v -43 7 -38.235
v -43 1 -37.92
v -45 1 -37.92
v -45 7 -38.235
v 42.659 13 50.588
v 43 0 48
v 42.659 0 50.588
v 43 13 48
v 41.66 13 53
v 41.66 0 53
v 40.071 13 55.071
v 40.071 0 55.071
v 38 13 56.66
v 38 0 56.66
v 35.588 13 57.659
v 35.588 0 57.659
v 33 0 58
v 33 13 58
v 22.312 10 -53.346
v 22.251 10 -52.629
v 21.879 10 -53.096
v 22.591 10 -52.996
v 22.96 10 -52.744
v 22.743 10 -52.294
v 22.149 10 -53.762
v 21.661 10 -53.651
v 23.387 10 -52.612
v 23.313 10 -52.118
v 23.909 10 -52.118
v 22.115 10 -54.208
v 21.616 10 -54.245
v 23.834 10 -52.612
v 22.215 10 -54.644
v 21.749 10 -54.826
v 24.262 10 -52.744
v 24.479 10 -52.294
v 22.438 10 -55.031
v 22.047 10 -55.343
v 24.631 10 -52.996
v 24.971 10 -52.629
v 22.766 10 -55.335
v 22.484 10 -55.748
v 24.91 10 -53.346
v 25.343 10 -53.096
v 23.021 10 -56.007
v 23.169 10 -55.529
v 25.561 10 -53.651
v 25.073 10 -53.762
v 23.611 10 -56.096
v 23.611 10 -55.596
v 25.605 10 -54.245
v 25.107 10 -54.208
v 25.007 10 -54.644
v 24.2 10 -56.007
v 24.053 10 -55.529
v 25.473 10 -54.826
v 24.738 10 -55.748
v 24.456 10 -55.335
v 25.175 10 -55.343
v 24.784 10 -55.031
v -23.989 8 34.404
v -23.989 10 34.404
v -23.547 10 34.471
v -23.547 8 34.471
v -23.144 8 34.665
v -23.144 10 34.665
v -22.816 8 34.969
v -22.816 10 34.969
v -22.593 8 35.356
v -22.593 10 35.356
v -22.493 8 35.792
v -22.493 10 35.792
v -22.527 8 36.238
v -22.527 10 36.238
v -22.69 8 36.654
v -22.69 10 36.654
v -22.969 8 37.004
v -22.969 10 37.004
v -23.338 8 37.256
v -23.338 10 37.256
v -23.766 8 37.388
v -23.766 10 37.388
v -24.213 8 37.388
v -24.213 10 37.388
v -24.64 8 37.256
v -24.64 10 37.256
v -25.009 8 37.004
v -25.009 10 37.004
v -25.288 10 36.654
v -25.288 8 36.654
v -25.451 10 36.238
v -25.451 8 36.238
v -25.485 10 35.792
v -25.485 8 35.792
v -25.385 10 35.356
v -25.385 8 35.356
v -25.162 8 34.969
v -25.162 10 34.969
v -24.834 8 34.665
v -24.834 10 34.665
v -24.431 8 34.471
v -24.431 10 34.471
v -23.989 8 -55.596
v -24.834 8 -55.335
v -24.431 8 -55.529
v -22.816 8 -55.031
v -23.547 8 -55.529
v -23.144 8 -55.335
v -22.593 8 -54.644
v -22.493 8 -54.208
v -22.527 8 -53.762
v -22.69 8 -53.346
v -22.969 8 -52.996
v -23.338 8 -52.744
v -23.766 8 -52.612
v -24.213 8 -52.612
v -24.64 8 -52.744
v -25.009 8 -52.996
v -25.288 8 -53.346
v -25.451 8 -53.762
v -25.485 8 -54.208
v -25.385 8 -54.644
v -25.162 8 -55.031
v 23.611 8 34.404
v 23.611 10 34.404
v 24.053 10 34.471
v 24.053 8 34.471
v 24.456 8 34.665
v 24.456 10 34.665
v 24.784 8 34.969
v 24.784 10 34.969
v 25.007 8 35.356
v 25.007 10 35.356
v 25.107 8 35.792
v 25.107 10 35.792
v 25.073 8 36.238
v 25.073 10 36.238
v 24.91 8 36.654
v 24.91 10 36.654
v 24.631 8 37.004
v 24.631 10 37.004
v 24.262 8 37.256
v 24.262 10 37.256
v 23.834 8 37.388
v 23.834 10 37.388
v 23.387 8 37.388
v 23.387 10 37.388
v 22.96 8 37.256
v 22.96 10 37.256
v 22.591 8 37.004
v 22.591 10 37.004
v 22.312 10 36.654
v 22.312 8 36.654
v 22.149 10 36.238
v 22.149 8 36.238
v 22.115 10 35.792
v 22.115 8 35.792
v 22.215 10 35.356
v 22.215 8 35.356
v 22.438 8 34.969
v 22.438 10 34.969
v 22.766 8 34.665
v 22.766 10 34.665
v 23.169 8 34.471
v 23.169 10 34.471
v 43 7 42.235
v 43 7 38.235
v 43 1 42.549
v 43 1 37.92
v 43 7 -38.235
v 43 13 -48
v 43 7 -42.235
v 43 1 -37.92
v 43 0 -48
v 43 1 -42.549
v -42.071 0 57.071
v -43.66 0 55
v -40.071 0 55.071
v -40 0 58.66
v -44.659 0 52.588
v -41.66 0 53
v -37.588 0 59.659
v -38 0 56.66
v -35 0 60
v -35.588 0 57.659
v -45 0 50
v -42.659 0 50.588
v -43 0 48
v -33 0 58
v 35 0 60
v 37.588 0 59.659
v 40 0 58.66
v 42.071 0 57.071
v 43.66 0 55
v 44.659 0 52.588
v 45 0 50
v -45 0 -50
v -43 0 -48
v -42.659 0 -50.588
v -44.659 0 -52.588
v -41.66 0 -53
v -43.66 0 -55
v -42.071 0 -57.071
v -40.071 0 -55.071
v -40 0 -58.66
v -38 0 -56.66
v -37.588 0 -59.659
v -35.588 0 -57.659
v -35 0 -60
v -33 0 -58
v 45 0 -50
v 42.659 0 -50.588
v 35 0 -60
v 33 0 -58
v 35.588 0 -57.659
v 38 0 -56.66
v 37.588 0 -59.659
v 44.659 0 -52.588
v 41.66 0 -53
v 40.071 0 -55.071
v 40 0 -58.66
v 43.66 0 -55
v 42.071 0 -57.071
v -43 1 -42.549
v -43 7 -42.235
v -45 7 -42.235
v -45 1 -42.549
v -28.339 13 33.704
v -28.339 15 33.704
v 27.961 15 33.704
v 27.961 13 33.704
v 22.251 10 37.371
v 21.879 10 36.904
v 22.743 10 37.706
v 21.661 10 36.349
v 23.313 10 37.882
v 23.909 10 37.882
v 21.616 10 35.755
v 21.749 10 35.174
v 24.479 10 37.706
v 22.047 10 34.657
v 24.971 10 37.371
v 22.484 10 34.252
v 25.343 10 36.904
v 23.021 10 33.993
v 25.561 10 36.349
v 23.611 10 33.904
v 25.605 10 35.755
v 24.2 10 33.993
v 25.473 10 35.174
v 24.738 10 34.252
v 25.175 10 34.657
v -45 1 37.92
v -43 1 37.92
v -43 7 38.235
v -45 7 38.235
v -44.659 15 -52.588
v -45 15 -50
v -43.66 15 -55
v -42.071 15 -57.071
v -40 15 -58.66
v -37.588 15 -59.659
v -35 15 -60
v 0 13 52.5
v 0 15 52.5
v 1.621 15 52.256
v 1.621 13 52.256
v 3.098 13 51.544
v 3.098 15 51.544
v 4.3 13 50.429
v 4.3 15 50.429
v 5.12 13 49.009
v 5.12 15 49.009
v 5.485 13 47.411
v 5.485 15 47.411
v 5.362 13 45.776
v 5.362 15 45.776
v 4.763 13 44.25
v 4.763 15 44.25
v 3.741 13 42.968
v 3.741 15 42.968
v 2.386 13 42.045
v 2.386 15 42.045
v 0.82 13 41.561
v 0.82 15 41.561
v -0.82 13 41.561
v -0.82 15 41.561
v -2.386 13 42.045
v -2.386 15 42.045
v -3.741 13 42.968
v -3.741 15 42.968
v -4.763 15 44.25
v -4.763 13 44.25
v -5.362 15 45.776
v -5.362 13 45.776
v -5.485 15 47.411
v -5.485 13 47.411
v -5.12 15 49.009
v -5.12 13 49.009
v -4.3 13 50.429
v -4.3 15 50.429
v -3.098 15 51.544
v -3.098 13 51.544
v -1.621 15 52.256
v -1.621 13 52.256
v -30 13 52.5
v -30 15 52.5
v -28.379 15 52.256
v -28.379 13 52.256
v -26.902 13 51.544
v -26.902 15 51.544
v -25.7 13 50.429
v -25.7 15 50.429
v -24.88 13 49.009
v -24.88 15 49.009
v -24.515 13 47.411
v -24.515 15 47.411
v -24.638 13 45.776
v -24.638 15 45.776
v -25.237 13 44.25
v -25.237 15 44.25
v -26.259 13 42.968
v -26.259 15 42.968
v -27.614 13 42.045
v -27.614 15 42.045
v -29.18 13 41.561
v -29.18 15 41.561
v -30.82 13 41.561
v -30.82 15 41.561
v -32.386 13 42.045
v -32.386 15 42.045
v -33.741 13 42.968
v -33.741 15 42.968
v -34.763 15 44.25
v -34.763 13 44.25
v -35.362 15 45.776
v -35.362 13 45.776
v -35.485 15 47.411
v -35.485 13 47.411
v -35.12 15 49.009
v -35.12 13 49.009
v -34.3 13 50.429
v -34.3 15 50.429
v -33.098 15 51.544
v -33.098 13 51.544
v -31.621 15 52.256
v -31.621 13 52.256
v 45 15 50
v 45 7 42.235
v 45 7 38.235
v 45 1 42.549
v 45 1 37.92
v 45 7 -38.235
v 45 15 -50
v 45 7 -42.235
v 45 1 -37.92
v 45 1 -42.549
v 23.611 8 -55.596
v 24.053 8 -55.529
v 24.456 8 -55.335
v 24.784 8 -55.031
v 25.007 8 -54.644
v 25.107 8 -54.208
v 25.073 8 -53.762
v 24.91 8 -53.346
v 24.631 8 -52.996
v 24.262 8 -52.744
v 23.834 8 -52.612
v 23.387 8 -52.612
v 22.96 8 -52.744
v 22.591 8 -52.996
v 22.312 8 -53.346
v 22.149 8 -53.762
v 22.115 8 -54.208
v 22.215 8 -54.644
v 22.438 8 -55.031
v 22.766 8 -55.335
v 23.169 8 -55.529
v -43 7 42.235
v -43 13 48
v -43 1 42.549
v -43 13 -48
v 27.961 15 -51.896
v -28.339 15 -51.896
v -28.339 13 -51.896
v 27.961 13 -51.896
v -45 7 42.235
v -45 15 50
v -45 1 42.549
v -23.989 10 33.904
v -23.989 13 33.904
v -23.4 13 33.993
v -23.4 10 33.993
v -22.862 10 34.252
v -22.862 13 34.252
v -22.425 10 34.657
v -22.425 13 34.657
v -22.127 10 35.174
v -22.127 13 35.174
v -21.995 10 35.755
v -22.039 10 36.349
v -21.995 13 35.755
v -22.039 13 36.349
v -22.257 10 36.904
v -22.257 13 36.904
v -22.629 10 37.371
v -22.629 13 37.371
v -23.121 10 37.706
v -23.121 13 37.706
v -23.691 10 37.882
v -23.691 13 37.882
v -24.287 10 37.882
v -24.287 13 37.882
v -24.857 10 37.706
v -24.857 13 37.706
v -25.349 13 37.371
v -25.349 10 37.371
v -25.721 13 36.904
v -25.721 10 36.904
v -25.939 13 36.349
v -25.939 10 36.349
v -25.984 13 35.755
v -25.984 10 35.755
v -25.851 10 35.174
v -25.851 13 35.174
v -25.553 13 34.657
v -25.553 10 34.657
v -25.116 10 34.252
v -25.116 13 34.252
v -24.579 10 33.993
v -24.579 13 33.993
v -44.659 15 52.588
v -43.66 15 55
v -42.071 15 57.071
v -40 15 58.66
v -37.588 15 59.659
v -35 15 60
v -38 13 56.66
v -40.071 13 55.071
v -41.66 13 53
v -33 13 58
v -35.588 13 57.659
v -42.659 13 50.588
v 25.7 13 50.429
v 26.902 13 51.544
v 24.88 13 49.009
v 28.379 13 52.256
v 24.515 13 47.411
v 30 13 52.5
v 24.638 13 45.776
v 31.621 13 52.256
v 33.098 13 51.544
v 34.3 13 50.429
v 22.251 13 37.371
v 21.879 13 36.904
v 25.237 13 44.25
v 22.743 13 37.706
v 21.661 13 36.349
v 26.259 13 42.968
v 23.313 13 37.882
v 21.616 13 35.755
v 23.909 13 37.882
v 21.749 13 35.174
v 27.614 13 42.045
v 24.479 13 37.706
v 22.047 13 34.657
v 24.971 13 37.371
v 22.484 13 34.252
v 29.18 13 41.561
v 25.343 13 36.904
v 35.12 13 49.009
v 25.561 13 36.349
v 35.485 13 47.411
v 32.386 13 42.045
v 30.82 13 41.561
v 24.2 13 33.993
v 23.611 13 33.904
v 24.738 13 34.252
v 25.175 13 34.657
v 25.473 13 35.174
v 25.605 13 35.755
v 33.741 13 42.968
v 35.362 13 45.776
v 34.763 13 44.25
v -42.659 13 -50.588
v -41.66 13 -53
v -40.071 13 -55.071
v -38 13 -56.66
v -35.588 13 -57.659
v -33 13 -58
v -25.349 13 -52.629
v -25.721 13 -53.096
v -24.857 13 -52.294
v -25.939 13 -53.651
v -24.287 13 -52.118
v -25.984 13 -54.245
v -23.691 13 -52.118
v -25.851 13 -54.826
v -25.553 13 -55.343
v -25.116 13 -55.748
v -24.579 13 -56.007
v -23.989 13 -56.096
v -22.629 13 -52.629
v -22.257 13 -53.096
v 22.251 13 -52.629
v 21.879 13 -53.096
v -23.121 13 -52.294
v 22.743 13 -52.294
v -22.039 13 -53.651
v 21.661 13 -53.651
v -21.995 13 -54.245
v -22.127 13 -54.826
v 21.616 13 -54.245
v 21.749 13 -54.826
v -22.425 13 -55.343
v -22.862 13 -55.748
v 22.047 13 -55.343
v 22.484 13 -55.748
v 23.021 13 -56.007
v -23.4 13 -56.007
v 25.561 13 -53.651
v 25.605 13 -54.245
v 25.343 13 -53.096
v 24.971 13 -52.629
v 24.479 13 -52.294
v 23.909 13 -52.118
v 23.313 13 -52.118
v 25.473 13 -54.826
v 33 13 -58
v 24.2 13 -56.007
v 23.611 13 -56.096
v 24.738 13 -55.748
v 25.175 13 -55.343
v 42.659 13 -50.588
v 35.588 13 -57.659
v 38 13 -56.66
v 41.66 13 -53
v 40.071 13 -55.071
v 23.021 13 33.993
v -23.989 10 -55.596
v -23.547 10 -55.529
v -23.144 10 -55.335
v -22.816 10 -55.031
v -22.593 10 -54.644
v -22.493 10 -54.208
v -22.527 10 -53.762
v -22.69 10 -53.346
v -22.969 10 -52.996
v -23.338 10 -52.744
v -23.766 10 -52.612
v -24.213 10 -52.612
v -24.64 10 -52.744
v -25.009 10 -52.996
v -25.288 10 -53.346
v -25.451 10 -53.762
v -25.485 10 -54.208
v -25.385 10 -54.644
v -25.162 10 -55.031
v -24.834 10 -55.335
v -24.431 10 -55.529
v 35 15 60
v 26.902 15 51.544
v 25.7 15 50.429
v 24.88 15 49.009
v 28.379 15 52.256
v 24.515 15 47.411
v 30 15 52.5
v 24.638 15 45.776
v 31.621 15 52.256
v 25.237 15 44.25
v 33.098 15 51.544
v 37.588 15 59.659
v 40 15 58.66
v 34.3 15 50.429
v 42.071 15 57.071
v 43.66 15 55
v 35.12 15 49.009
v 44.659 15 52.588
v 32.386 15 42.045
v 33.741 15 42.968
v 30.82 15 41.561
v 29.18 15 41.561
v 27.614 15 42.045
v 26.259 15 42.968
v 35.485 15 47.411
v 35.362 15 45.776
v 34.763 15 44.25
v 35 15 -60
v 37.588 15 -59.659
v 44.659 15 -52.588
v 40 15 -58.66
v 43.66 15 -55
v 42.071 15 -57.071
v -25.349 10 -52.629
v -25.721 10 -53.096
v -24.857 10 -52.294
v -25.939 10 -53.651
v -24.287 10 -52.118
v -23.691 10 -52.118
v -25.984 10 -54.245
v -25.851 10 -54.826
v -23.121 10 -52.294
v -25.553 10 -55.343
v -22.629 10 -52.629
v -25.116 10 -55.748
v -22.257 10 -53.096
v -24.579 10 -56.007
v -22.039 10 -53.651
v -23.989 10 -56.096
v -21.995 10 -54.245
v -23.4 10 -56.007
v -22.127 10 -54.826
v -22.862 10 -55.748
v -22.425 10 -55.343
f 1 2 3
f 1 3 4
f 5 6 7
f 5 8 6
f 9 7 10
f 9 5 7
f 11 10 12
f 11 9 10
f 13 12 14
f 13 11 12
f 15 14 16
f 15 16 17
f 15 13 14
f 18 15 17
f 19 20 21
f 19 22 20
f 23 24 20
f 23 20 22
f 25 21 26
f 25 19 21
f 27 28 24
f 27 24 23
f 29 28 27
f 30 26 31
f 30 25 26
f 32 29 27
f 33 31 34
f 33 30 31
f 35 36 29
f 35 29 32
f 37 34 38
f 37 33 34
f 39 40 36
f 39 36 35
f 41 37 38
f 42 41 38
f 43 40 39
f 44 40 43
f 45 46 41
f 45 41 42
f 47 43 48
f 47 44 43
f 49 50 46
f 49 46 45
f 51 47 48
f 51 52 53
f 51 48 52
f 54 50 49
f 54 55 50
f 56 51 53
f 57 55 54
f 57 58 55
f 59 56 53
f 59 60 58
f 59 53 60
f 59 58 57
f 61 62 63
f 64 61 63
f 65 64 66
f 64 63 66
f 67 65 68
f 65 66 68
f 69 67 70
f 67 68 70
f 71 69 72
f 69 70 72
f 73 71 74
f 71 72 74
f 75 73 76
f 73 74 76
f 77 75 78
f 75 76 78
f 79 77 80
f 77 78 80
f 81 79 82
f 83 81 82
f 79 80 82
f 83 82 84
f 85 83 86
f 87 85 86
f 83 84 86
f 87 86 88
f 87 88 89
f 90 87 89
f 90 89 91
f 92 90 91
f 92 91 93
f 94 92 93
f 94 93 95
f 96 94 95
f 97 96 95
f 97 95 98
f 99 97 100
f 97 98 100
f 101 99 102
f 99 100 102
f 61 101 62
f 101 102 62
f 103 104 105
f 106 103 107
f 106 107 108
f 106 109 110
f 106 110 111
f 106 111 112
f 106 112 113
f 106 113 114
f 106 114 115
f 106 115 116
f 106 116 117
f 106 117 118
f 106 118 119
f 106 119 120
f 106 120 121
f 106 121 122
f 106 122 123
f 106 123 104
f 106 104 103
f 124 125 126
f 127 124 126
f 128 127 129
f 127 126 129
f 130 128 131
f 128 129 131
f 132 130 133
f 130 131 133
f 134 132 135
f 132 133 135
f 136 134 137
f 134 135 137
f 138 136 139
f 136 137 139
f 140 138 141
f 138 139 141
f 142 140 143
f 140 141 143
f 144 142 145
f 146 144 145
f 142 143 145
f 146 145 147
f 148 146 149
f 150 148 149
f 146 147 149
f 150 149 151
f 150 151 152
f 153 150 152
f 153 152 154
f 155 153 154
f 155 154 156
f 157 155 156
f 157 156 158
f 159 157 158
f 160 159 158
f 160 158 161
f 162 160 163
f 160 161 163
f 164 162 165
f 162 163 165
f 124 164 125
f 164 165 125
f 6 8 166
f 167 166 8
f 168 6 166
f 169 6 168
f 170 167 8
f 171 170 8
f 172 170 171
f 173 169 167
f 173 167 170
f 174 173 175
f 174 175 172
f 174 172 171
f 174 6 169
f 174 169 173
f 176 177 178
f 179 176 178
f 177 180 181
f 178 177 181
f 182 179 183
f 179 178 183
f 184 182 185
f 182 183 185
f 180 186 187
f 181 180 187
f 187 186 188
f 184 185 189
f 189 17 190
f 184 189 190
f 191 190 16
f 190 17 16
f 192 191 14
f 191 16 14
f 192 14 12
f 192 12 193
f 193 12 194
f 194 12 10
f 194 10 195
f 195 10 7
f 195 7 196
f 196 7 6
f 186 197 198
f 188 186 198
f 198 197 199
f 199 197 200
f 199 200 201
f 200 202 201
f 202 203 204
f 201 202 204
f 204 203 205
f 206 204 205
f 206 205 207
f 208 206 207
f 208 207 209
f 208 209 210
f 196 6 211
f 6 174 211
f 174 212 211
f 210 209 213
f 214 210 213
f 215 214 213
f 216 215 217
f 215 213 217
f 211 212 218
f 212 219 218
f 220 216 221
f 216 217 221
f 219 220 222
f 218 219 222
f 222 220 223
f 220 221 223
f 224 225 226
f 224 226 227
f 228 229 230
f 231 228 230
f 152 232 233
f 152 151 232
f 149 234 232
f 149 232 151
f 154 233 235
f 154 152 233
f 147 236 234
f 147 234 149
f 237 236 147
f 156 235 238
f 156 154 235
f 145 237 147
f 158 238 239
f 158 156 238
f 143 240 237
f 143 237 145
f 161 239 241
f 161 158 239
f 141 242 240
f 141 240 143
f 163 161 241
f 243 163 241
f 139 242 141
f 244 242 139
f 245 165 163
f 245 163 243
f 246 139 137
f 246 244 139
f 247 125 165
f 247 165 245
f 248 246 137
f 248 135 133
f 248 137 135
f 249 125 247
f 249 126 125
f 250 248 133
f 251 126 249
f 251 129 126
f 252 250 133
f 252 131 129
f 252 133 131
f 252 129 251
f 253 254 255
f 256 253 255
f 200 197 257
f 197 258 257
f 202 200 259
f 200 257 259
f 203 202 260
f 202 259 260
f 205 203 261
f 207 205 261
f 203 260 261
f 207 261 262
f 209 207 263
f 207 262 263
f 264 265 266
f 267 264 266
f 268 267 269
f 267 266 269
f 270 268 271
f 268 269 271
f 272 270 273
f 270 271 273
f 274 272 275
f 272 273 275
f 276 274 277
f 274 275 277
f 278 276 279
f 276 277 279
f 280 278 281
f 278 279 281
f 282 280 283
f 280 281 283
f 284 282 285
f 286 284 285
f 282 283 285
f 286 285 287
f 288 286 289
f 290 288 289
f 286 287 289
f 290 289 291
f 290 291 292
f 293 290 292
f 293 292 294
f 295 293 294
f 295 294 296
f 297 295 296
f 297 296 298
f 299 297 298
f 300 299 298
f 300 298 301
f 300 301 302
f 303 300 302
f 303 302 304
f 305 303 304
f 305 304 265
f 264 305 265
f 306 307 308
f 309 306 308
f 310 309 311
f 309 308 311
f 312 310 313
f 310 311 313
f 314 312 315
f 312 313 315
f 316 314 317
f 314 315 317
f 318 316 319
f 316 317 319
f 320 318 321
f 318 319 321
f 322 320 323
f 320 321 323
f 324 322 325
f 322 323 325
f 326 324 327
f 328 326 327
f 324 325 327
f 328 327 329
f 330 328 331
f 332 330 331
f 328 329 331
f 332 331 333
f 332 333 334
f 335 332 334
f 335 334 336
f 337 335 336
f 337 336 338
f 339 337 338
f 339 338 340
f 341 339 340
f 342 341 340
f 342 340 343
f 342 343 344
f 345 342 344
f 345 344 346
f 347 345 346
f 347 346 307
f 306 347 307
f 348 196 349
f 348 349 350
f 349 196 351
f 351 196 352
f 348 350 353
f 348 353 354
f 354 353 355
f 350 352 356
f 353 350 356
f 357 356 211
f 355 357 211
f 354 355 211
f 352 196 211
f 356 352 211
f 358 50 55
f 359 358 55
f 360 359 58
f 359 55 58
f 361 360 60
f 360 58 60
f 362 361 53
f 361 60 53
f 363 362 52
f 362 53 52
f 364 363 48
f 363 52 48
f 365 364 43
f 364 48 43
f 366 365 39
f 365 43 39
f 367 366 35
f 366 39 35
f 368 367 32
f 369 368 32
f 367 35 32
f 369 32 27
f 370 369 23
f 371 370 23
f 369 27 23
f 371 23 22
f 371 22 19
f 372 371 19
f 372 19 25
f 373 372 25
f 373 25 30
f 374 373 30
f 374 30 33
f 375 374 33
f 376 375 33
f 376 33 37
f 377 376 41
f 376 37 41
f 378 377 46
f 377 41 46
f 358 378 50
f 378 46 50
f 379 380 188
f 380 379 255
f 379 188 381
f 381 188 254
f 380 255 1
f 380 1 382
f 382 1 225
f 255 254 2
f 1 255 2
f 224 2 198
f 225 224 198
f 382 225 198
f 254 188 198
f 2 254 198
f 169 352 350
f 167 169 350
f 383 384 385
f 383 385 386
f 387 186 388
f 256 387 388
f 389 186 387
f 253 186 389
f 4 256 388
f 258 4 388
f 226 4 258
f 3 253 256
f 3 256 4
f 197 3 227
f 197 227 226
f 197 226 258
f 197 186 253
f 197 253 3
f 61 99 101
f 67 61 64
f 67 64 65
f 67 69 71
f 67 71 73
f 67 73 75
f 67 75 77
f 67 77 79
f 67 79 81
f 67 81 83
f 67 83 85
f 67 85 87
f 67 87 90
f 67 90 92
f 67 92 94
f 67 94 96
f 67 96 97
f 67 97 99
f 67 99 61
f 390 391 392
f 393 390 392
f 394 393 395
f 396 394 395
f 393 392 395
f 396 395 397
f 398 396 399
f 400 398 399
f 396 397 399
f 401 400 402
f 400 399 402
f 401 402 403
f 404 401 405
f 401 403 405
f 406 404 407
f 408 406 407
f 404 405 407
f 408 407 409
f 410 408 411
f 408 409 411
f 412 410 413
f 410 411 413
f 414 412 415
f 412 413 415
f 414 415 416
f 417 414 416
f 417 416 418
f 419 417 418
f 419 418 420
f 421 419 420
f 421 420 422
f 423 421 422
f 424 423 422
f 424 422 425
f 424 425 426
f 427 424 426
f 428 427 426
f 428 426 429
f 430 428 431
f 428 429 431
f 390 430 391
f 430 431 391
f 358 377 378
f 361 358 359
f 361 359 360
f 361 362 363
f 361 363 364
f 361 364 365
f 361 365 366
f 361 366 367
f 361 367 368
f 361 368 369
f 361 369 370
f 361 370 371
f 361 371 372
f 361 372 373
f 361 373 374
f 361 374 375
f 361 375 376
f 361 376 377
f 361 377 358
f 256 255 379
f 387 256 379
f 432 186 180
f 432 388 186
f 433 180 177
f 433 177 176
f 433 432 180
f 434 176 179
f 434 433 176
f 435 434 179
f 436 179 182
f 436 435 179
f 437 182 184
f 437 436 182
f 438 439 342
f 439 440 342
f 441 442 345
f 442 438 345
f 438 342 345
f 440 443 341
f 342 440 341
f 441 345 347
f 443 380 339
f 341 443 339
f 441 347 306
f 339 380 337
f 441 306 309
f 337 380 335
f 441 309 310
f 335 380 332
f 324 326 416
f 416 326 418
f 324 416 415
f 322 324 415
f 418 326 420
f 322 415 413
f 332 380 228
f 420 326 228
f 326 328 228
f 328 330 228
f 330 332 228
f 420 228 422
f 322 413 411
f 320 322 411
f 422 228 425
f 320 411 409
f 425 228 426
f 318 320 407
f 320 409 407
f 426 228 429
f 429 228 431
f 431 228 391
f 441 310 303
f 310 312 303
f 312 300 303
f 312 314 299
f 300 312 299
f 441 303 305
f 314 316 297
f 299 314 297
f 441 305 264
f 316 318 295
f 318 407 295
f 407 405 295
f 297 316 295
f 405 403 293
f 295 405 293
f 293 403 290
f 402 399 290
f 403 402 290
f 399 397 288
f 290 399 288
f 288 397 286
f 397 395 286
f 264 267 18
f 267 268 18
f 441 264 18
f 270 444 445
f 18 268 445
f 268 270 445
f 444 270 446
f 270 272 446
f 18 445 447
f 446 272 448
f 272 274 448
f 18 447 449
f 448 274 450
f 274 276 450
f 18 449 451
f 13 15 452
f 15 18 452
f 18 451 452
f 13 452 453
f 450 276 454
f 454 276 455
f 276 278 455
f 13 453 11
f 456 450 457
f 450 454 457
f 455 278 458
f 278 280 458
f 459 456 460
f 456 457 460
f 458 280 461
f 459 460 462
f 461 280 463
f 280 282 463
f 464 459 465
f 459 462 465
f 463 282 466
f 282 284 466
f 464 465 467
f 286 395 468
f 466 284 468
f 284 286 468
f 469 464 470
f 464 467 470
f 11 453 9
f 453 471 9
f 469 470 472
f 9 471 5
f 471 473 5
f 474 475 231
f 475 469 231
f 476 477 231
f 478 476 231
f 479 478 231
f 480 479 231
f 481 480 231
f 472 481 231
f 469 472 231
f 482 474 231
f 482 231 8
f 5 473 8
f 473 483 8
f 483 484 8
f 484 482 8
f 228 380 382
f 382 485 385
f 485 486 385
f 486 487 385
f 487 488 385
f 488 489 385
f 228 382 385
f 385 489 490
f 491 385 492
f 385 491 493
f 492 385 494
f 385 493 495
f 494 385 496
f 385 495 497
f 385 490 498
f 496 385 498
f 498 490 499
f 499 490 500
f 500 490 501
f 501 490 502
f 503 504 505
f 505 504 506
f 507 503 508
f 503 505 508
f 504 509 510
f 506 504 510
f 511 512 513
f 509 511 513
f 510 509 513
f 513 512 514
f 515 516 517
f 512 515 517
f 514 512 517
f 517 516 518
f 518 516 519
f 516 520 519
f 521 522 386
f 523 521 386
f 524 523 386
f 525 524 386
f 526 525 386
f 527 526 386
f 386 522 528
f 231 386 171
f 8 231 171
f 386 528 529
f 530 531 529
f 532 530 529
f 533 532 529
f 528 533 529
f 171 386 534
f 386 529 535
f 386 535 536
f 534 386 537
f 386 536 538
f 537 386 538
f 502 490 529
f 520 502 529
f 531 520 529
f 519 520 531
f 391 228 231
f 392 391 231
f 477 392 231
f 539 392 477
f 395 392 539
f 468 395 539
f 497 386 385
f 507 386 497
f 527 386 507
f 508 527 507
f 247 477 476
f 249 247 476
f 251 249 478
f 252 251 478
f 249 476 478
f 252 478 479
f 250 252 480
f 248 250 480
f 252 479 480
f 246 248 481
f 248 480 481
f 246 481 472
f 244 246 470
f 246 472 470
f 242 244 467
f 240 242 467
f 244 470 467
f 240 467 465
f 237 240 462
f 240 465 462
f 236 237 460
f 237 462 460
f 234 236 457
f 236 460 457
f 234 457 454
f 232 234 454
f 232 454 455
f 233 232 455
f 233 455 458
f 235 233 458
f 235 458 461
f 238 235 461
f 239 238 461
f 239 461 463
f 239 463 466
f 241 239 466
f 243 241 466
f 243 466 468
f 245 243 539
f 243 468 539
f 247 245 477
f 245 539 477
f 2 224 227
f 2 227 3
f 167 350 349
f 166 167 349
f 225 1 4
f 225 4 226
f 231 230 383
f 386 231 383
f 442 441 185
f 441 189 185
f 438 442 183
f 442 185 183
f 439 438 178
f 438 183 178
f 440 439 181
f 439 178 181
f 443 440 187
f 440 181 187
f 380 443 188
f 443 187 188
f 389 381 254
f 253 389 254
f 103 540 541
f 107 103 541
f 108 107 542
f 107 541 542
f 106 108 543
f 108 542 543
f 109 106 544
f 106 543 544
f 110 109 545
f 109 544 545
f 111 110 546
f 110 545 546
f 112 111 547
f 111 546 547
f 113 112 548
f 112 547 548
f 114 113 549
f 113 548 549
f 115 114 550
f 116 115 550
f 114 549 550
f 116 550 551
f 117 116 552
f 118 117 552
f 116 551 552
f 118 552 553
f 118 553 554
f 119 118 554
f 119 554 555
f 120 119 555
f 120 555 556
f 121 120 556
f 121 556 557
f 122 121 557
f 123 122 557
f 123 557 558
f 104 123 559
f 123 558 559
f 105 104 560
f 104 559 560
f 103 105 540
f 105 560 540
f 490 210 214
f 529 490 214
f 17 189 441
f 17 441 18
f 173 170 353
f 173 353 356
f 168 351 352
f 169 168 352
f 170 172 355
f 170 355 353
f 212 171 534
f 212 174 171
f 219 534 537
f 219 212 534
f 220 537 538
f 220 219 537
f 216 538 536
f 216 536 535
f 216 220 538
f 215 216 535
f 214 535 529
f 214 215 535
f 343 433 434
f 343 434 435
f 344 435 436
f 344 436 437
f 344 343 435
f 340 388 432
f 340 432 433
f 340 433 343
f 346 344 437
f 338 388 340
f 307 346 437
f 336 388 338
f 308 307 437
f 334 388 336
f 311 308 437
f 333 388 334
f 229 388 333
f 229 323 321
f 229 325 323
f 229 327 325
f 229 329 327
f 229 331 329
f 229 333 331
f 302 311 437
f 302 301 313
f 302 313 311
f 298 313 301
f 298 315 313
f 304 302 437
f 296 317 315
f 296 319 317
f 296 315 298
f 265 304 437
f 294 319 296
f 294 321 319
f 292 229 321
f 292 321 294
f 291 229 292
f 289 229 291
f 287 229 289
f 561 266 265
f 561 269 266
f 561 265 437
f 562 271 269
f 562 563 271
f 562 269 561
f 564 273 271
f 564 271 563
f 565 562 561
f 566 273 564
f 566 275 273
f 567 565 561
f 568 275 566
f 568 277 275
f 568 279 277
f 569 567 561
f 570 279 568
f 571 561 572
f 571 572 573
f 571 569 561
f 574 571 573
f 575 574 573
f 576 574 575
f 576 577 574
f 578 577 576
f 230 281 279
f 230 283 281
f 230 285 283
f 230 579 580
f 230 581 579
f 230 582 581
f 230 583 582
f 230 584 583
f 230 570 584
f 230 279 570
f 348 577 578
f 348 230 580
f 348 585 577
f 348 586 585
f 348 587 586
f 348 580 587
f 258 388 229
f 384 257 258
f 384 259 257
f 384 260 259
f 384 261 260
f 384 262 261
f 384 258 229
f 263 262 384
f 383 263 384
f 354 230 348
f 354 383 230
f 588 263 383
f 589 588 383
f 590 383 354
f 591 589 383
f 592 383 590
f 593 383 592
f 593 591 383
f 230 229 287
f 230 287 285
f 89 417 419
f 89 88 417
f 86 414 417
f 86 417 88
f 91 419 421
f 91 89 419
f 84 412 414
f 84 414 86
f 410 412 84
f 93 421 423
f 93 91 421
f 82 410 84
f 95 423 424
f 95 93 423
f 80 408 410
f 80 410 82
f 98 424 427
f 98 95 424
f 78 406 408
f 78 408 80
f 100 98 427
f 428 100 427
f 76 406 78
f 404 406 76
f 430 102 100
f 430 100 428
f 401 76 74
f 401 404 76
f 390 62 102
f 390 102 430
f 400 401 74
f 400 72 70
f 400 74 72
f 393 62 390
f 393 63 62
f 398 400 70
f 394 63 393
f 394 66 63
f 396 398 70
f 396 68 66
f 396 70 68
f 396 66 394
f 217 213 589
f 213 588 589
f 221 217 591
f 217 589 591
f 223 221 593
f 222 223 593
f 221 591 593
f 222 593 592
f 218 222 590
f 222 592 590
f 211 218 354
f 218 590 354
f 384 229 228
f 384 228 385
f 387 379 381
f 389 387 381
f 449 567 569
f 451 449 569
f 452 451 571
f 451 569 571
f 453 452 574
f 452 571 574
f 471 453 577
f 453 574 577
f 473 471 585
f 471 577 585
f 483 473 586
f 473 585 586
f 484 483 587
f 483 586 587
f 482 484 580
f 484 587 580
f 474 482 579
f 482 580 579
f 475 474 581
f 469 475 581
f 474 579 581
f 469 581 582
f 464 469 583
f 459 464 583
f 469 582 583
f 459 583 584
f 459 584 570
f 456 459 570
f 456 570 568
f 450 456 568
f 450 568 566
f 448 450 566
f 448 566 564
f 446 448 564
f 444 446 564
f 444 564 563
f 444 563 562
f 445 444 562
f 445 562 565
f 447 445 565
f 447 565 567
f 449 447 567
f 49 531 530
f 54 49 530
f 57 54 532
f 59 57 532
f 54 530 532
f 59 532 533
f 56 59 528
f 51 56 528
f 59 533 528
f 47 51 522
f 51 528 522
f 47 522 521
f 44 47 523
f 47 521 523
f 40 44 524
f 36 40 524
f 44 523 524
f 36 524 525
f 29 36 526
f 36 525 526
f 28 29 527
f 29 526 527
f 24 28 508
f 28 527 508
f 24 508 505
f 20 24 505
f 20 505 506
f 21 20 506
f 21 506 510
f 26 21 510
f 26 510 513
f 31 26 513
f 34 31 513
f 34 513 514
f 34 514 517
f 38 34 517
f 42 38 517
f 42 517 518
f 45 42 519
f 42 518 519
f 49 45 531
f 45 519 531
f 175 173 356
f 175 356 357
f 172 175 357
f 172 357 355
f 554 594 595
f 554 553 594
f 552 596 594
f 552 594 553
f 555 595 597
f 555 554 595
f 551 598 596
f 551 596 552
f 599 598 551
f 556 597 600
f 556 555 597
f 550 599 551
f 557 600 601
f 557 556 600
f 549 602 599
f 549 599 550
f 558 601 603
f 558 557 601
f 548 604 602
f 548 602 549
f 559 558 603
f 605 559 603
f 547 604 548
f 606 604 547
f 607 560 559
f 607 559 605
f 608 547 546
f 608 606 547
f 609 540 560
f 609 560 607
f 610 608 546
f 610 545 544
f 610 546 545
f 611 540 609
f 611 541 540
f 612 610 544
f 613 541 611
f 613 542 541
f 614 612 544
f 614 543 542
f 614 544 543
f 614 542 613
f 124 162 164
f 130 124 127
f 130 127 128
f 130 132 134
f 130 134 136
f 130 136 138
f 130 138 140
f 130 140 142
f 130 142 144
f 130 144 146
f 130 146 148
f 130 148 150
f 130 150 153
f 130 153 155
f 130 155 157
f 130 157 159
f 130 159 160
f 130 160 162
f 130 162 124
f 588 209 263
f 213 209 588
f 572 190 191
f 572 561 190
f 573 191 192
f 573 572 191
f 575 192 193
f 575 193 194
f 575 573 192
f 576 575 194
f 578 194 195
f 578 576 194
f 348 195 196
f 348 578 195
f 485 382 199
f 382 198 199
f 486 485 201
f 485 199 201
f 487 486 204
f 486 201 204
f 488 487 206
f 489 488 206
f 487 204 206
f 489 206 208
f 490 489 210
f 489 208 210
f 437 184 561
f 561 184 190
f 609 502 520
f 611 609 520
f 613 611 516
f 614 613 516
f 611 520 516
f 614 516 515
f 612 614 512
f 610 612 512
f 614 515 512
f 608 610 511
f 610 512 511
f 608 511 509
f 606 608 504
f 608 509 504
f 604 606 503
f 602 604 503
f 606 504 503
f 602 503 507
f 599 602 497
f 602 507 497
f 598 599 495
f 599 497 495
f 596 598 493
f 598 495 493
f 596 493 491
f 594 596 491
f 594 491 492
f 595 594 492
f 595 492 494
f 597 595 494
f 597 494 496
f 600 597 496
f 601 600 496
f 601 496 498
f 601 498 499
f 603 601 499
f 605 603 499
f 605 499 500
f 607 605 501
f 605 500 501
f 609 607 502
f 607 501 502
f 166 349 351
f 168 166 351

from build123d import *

# Parameters (mm, degrees)
CROQUIS1_W               = 90
CROQUIS1_H               = 120
SALIENTE_EXTRUIR1_DEPTH  = 15
VACIADO1_T               = -2
CROQUIS3_W               = 56.3
CROQUIS3_H               = 85.6
CORTAR_EXTRUIR1_DEPTH    = 10
CROQUIS4_R               = 2
SALIENTE_EXTRUIR2_DEPTH  = 3
CROQUIS5_R               = 1.5
SALIENTE_EXTRUIR3_DEPTH  = 2
CROQUIS6_R               = 5.5
CORTAR_EXTRUIR2_DEPTH    = 4
REDONDEO1_R              = 10
RANURA_START             = 43
RANURA_DE_RESORTE1_DEPTH = 2
CORTAR_EXTRUIR3_DEPTH    = 110.201648339


# Read off the part's stored shape, not the designer's step: Ranura de resorte1
with BuildPart() as part:
    # Croquis1 → Saliente-Extruir1 (new body)
    with BuildSketch(Plane(origin=(0, 0, 0), x_dir=(1, 0, 0), z_dir=(0, 1, 0))):
        Rectangle(CROQUIS1_W, CROQUIS1_H)
    extrude(amount=SALIENTE_EXTRUIR1_DEPTH)

    # Vaciado1
    vaciado1_openings = [part.faces().sort_by_distance(p)[0] for p in [
        (0, 0, 0),
    ]]
    offset(amount=VACIADO1_T, openings=vaciado1_openings, kind=Kind.INTERSECTION)

    # Croquis3 → Cortar-Extruir1 (cut)
    with BuildSketch(Plane(origin=(0, 15, 0), x_dir=(1, 0, 0), z_dir=(0, 1, 0))):
        with Locations((-0.189097346, 9.095595484)):
            Rectangle(CROQUIS3_W, CROQUIS3_H)
    extrude(amount=-CORTAR_EXTRUIR1_DEPTH, mode=Mode.SUBTRACT)

    # Croquis4 → Saliente-Extruir2 (add)
    with BuildSketch(Plane.XZ.offset(-13)):
        with Locations(Location((-23.989097346, 35.904404516, 0), (0, 0, 270))):
            Circle(CROQUIS4_R)
        with Locations(Location((23.610902654, 35.904404516, 0), (0, 0, 270))):
            Circle(CROQUIS4_R)
        with Locations(Location((-23.989097346, -54.095595484, 0), (0, 0, 270))):
            Circle(CROQUIS4_R)
        with Locations(Location((23.610902654, -54.095595484, 0), (0, 0, 270))):
            Circle(CROQUIS4_R)
    extrude(amount=SALIENTE_EXTRUIR2_DEPTH)

    # Croquis5 → Saliente-Extruir3 (add)
    with BuildSketch(Plane.XZ.offset(-10)):
        with Locations(Location((-23.989097346, -54.095595484, 0), (0, 0, 270))):
            Circle(CROQUIS5_R)
        with Locations(Location((23.610902654, -54.095595484, 0), (0, 0, 270))):
            Circle(CROQUIS5_R)
        with Locations(Location((23.610902654, 35.904404516, 0), (0, 0, 270))):
            Circle(CROQUIS5_R)
        with Locations(Location((-23.989097346, 35.904404516, 0), (0, 0, 270))):
            Circle(CROQUIS5_R)
    extrude(amount=SALIENTE_EXTRUIR3_DEPTH)

    # Croquis6 → Cortar-Extruir2 (cut)
    with BuildSketch(Plane(origin=(0, 15, 0), x_dir=(1, 0, 0), z_dir=(0, 1, 0))):
        with Locations(Location((-30, -47, 0), (0, 0, 270))):
            Circle(CROQUIS6_R)
        with Locations(Location((0, -47, 0), (0, 0, 270))):
            Circle(CROQUIS6_R)
        with Locations(Location((30, -47, 0), (0, 0, 270))):
            Circle(CROQUIS6_R)
    extrude(amount=-CORTAR_EXTRUIR2_DEPTH, mode=Mode.SUBTRACT)

    # Redondeo1
    redondeo1_edges = [part.edges().sort_by_distance(p)[0] for p in [
        (-43, 6.5, -58),
        (-43, 6.5, 58),
        (43, 6.5, 58),
        (43, 6.5, -58),
        (-45, 7.5, -60),
        (45, 7.5, -60),
        (45, 7.5, 60),
        (-45, 7.5, 60),
    ]]
    fillet(redondeo1_edges, radius=REDONDEO1_R)

    # Ranura de resorte1 outline → Ranura de resorte1 (cut)
    with BuildSketch(Plane.YZ.offset(RANURA_START)):
        Polygon((7, -38.234845775), (1, -37.9203991), (1, -42.549292451), (7, -42.234845775), align=None)
    extrude(amount=RANURA_DE_RESORTE1_DEPTH, mode=Mode.SUBTRACT)

    # Croquis7 → Cortar-Extruir3 (cut, through all)
    with BuildSketch(Plane(origin=(45, 0, 0), x_dir=(0, 0, -1), z_dir=(1, 0, 0))):
        Polygon((42.549292451, 1), (37.9203991, 1), (38.234845775, 7), (42.234845775, 7), align=None)
        Polygon((-42.234845775, 7), (-42.549292451, 1), (-37.9203991, 1), (-38.234845775, 7), align=None)
    extrude(amount=-CORTAR_EXTRUIR3_DEPTH, mode=Mode.SUBTRACT)


solid = part.part
